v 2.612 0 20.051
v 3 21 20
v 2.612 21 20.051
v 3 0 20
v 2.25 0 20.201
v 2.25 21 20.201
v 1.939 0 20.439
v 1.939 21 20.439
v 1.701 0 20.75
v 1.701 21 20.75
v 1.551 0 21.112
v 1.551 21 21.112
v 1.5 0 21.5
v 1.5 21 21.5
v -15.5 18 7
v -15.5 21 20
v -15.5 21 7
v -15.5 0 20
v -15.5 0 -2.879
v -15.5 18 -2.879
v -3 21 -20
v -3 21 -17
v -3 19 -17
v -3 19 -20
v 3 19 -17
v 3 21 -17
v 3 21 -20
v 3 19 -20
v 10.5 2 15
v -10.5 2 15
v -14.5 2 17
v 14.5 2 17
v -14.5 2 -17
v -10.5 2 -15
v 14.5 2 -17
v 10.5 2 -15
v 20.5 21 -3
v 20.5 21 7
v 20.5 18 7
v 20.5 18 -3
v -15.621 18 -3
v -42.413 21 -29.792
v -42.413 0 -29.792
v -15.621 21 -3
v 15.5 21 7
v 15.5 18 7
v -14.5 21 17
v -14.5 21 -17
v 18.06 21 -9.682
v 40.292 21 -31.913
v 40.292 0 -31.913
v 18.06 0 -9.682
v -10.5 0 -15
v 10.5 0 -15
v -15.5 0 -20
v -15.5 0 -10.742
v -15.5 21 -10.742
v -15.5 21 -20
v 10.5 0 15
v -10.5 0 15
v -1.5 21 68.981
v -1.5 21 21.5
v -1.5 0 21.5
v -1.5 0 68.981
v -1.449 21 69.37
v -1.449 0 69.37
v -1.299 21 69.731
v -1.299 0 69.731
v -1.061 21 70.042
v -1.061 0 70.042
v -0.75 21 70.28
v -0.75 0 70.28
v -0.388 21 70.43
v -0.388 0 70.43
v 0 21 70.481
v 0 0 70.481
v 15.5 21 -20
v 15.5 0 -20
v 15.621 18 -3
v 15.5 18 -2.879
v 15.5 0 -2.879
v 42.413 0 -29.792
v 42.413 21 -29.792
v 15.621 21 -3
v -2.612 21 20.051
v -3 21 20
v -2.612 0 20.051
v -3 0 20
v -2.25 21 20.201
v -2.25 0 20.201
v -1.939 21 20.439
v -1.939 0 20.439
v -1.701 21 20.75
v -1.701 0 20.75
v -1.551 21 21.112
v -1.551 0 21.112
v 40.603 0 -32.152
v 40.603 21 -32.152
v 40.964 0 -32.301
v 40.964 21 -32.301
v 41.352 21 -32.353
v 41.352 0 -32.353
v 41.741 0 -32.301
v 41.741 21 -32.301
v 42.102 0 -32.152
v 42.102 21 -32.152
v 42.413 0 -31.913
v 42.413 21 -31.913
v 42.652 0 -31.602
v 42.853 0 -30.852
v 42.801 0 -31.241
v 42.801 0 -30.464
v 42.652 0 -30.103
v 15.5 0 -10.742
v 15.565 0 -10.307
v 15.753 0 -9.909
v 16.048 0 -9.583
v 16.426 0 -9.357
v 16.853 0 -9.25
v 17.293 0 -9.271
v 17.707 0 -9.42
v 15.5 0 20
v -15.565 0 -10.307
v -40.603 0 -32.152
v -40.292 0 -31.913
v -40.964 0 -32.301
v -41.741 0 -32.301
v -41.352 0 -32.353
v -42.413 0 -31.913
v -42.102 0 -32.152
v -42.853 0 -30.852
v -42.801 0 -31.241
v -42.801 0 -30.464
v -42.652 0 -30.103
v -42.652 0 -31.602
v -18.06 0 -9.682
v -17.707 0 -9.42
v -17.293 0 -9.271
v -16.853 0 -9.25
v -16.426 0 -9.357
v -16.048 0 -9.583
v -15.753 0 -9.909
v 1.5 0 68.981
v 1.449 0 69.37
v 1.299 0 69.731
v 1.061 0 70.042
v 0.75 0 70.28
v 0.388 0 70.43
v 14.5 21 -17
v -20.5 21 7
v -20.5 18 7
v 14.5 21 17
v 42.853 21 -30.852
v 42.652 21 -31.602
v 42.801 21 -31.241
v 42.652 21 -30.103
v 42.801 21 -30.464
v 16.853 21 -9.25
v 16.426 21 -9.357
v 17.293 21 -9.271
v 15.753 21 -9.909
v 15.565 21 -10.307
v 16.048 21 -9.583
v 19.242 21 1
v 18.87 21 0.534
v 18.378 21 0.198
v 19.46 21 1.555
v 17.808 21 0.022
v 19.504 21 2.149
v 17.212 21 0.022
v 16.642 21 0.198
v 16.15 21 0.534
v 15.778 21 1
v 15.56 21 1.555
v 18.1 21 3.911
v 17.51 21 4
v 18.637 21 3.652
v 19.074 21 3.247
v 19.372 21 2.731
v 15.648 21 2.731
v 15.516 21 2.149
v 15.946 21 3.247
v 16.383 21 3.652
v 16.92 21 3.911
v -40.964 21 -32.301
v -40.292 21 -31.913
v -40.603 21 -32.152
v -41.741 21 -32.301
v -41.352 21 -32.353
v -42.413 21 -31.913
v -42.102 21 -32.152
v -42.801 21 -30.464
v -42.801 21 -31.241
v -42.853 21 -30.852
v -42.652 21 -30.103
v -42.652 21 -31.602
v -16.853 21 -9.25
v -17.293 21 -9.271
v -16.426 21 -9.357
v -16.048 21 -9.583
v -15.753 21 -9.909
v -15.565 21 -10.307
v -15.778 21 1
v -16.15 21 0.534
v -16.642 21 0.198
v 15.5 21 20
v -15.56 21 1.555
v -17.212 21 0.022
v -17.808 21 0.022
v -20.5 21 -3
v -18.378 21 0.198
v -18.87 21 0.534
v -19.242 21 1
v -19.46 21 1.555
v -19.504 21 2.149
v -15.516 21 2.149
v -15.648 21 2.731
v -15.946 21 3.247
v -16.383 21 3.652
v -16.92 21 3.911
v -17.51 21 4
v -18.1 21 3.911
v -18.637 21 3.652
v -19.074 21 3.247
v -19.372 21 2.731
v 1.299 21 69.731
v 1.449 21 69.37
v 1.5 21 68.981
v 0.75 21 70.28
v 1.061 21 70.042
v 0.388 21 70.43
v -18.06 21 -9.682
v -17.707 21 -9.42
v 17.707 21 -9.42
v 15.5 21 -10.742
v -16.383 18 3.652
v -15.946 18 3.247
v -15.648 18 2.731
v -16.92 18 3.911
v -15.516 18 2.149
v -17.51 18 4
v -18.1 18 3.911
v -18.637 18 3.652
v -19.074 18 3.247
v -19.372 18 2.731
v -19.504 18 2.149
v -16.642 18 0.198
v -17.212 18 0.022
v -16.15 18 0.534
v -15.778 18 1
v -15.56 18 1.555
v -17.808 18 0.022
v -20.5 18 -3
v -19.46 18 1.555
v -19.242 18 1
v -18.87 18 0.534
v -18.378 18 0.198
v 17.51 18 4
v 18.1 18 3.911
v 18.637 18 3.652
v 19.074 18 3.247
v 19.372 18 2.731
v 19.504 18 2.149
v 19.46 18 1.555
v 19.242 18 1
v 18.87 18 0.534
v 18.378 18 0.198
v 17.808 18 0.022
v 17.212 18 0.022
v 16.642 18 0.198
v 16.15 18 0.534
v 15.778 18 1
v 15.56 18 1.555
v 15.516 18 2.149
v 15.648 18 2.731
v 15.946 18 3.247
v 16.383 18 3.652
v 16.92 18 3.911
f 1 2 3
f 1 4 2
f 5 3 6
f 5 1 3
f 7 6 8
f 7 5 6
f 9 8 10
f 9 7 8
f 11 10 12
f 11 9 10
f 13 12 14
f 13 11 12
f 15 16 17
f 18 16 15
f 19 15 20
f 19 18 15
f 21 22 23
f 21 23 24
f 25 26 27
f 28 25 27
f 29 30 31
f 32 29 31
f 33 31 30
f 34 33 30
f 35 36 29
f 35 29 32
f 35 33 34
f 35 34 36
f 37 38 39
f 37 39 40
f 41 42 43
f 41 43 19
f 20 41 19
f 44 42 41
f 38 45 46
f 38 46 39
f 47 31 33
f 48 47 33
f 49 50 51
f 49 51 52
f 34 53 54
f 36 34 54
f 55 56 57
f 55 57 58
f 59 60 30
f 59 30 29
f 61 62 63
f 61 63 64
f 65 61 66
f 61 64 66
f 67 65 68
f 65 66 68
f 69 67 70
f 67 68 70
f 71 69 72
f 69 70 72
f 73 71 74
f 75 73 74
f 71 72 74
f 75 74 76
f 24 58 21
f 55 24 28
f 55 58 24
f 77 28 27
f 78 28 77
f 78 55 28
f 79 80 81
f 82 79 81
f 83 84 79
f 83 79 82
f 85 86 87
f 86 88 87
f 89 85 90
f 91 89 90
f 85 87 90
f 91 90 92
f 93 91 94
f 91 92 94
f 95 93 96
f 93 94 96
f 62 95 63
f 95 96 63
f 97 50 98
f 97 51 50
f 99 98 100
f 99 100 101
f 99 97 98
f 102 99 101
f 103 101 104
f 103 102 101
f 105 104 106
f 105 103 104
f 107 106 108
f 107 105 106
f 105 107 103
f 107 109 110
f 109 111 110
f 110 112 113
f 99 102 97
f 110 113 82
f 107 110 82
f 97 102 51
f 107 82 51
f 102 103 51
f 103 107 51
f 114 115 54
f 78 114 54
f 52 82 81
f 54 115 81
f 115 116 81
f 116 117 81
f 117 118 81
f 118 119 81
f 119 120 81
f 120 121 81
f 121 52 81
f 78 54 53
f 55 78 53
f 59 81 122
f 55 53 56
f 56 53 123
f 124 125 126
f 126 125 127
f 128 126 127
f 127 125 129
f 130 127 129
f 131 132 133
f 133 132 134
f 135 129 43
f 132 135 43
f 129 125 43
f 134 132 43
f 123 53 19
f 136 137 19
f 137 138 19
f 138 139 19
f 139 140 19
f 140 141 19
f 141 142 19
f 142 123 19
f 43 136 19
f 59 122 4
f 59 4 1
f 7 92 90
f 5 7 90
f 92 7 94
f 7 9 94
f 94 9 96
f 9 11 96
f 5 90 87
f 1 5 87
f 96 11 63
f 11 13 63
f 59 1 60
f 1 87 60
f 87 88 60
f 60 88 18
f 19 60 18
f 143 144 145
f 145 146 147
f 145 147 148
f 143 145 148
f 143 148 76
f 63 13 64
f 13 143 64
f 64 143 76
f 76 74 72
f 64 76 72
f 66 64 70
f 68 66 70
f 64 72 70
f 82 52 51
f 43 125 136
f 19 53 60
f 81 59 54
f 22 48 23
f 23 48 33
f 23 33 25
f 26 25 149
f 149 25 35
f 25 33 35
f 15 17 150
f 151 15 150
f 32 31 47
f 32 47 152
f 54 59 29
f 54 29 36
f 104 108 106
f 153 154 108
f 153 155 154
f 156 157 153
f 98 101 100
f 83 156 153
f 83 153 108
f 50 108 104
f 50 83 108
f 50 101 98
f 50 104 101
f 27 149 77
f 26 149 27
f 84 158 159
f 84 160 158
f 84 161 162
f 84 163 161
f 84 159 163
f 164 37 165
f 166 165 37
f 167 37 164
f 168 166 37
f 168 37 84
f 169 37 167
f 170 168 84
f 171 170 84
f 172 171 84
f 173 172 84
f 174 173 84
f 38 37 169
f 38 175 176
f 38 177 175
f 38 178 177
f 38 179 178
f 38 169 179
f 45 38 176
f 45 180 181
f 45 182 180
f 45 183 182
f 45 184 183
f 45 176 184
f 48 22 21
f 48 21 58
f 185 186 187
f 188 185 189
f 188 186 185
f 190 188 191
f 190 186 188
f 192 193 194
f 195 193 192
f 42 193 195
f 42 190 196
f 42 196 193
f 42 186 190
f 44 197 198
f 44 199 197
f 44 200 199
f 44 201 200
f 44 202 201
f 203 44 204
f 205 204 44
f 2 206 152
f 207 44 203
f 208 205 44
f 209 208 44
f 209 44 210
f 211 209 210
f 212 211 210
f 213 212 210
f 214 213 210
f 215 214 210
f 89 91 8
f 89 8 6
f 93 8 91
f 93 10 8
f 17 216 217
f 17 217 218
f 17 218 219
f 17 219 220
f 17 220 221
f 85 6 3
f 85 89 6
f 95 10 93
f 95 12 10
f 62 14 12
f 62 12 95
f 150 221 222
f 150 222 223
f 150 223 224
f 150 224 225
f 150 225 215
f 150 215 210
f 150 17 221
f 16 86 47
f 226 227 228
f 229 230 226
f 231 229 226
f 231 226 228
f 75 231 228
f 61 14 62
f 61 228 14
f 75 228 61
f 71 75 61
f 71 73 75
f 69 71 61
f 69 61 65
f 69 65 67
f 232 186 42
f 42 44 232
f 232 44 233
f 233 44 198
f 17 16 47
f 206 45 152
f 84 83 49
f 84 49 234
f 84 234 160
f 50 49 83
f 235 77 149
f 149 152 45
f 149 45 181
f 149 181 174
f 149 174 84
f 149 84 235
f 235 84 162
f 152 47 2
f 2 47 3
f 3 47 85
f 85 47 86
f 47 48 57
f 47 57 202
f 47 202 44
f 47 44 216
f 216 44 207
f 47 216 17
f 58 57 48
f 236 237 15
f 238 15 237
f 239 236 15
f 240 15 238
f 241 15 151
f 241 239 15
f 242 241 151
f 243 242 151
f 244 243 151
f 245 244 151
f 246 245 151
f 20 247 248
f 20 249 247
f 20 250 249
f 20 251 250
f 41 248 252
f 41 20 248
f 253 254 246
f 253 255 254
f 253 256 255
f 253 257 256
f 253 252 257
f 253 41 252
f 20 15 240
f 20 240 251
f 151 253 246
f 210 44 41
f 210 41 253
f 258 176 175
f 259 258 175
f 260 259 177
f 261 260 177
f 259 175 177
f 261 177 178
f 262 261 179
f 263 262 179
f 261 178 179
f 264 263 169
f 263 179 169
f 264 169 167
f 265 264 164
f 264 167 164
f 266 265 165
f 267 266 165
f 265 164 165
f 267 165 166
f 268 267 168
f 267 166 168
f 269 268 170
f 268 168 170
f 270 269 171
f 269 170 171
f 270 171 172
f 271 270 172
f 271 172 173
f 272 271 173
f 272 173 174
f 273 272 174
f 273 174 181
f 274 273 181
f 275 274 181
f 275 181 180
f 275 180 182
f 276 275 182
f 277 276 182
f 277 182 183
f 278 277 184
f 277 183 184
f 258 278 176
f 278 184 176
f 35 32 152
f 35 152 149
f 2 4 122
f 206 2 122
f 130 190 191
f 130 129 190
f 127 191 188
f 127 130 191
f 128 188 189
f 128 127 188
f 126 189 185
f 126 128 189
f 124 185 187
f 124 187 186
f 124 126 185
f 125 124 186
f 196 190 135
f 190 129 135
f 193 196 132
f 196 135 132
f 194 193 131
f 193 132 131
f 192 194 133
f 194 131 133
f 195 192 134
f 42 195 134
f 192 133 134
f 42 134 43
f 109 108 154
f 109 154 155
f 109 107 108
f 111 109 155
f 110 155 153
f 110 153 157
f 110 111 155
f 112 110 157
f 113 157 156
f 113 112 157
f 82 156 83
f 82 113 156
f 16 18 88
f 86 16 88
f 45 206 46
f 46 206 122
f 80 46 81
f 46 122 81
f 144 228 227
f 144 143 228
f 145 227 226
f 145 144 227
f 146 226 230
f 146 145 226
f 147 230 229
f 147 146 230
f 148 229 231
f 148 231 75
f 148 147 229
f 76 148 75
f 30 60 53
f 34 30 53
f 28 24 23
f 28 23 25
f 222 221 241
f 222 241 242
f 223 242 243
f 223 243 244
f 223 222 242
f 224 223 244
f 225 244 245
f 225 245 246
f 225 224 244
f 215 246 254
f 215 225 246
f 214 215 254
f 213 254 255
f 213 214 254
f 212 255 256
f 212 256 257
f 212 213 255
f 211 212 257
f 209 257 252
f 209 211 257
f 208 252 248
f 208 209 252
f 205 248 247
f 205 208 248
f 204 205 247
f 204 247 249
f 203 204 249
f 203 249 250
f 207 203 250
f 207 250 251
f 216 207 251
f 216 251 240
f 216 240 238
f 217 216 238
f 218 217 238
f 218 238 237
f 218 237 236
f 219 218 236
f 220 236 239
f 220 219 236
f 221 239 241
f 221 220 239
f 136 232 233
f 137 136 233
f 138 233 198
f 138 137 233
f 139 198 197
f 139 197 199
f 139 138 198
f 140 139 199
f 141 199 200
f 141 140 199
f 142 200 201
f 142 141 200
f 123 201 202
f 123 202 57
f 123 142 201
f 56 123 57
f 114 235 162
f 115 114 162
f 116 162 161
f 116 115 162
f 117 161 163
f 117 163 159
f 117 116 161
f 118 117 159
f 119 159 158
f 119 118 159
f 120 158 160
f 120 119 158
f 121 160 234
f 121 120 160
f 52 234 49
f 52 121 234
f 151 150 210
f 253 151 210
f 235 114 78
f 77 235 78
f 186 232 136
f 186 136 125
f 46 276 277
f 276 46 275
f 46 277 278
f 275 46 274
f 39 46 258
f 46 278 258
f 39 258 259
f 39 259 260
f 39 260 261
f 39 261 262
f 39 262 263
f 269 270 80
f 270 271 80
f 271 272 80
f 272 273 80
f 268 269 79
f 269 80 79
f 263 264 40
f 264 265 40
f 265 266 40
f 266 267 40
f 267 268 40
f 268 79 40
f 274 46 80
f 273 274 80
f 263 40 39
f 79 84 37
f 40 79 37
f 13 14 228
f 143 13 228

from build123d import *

# Parameters (mm, degrees)
SKETCH1_W           = 31
SKETCH1_H           = 40
SKETCH1_W_2         = 21
SKETCH1_H_2         = 30
BOSS_EXTRUDE1_DEPTH = 2
SKETCH2_W           = 31
SKETCH2_H           = 40
SKETCH2_W_2         = 29
SKETCH2_H_2         = 34
BOSS_EXTRUDE2_DEPTH = 19
SKETCH4_W           = 5
SKETCH4_H           = 10
SKETCH4_R           = 2
BOSS_EXTRUDE3_DEPTH = 3
BOSS_EXTRUDE4_START = -21
SKETCH5_W           = 3
SKETCH5_H           = 50.481247069
BOSS_EXTRUDE4_DEPTH = 21
FILLET2_R           = 1.5
SKETCH7_W           = 6
SKETCH7_H           = 3
CUT_EXTRUDE4_DEPTH  = 2


with BuildPart() as part:
    # Sketch1 → Boss-Extrude1 (new body)
    with BuildSketch(Plane(origin=(0, 0, 0), x_dir=(1, 0, 0), z_dir=(0, 1, 0))):
        Rectangle(SKETCH1_W, SKETCH1_H)
        Rectangle(SKETCH1_W_2, SKETCH1_H_2, mode=Mode.SUBTRACT)
    extrude(amount=BOSS_EXTRUDE1_DEPTH)

    # Sketch2 → Boss-Extrude2 (add)
    with BuildSketch(Plane(origin=(0, 2, 0), x_dir=(1, 0, 0), z_dir=(0, 1, 0))):
        Rectangle(SKETCH2_W, SKETCH2_H)
        Rectangle(SKETCH2_W_2, SKETCH2_H_2, mode=Mode.SUBTRACT)
    extrude(amount=BOSS_EXTRUDE2_DEPTH)

    # Sketch4 → Boss-Extrude3 (add)
    with BuildSketch(Plane(origin=(0, 21, 0), x_dir=(1, 0, 0), z_dir=(0, 1, 0))):
        with Locations((18, -2)):
            Rectangle(SKETCH4_W, SKETCH4_H)
        with Locations(Location((17.51, -2, 0), (0, 0, 270))):
            Circle(SKETCH4_R, mode=Mode.SUBTRACT)
    boss_extrude3 = extrude(amount=-BOSS_EXTRUDE3_DEPTH)

    # Mirror1: Boss-Extrude3 across plane
    add(boss_extrude3.mirror(Plane(origin=(0, 0, 0), x_dir=(0, 0, 1), z_dir=(1, 0, 0))))

    # Sketch5 → Boss-Extrude4 (add)
    with BuildSketch(Plane.XZ.offset(BOSS_EXTRUDE4_START)):
        with Locations((0, 45.240623535)):
            Rectangle(SKETCH5_W, SKETCH5_H)
        Polygon((-41.352486375, -32.973806719), (-43.473806719, -30.852486375), (-15.5, -2.878679656), (-15.5, -7.121320344), align=None)
        Polygon((15.5, -2.878679656), (43.473806719, -30.852486375), (41.352486375, -32.973806719), (15.5, -7.121320344), align=None)
    extrude(amount=BOSS_EXTRUDE4_DEPTH)

    # Fillet2
    fillet2_edges = [part.edges().sort_by_distance(p)[0] for p in [
        (-41.352486375, 10.5, -32.973806719),
        (-43.473806719, 10.5, -30.852486375),
        (41.352486375, 10.5, -32.973806719),
        (43.473806719, 10.5, -30.852486375),
        (1.5, 10.5, 70.481247069),
        (-1.5, 10.5, 70.481247069),
        (1.5, 10.5, 20),
        (-1.5, 10.5, 20),
        (-15.5, 10.5, -7.121320344),
        (15.5, 10.5, -7.121320344),
    ]]
    fillet(fillet2_edges, radius=FILLET2_R - 0.0001)  # a hair under: the kernel refuses the full size

    # Sketch7 → Cut-Extrude4 (cut)
    with BuildSketch(Plane(origin=(0, 21, 0), x_dir=(1, 0, 0), z_dir=(0, 1, 0))):
        with Locations((0, 18.5)):
            Rectangle(SKETCH7_W, SKETCH7_H)
    extrude(amount=-CUT_EXTRUDE4_DEPTH, mode=Mode.SUBTRACT)


solid = part.part
